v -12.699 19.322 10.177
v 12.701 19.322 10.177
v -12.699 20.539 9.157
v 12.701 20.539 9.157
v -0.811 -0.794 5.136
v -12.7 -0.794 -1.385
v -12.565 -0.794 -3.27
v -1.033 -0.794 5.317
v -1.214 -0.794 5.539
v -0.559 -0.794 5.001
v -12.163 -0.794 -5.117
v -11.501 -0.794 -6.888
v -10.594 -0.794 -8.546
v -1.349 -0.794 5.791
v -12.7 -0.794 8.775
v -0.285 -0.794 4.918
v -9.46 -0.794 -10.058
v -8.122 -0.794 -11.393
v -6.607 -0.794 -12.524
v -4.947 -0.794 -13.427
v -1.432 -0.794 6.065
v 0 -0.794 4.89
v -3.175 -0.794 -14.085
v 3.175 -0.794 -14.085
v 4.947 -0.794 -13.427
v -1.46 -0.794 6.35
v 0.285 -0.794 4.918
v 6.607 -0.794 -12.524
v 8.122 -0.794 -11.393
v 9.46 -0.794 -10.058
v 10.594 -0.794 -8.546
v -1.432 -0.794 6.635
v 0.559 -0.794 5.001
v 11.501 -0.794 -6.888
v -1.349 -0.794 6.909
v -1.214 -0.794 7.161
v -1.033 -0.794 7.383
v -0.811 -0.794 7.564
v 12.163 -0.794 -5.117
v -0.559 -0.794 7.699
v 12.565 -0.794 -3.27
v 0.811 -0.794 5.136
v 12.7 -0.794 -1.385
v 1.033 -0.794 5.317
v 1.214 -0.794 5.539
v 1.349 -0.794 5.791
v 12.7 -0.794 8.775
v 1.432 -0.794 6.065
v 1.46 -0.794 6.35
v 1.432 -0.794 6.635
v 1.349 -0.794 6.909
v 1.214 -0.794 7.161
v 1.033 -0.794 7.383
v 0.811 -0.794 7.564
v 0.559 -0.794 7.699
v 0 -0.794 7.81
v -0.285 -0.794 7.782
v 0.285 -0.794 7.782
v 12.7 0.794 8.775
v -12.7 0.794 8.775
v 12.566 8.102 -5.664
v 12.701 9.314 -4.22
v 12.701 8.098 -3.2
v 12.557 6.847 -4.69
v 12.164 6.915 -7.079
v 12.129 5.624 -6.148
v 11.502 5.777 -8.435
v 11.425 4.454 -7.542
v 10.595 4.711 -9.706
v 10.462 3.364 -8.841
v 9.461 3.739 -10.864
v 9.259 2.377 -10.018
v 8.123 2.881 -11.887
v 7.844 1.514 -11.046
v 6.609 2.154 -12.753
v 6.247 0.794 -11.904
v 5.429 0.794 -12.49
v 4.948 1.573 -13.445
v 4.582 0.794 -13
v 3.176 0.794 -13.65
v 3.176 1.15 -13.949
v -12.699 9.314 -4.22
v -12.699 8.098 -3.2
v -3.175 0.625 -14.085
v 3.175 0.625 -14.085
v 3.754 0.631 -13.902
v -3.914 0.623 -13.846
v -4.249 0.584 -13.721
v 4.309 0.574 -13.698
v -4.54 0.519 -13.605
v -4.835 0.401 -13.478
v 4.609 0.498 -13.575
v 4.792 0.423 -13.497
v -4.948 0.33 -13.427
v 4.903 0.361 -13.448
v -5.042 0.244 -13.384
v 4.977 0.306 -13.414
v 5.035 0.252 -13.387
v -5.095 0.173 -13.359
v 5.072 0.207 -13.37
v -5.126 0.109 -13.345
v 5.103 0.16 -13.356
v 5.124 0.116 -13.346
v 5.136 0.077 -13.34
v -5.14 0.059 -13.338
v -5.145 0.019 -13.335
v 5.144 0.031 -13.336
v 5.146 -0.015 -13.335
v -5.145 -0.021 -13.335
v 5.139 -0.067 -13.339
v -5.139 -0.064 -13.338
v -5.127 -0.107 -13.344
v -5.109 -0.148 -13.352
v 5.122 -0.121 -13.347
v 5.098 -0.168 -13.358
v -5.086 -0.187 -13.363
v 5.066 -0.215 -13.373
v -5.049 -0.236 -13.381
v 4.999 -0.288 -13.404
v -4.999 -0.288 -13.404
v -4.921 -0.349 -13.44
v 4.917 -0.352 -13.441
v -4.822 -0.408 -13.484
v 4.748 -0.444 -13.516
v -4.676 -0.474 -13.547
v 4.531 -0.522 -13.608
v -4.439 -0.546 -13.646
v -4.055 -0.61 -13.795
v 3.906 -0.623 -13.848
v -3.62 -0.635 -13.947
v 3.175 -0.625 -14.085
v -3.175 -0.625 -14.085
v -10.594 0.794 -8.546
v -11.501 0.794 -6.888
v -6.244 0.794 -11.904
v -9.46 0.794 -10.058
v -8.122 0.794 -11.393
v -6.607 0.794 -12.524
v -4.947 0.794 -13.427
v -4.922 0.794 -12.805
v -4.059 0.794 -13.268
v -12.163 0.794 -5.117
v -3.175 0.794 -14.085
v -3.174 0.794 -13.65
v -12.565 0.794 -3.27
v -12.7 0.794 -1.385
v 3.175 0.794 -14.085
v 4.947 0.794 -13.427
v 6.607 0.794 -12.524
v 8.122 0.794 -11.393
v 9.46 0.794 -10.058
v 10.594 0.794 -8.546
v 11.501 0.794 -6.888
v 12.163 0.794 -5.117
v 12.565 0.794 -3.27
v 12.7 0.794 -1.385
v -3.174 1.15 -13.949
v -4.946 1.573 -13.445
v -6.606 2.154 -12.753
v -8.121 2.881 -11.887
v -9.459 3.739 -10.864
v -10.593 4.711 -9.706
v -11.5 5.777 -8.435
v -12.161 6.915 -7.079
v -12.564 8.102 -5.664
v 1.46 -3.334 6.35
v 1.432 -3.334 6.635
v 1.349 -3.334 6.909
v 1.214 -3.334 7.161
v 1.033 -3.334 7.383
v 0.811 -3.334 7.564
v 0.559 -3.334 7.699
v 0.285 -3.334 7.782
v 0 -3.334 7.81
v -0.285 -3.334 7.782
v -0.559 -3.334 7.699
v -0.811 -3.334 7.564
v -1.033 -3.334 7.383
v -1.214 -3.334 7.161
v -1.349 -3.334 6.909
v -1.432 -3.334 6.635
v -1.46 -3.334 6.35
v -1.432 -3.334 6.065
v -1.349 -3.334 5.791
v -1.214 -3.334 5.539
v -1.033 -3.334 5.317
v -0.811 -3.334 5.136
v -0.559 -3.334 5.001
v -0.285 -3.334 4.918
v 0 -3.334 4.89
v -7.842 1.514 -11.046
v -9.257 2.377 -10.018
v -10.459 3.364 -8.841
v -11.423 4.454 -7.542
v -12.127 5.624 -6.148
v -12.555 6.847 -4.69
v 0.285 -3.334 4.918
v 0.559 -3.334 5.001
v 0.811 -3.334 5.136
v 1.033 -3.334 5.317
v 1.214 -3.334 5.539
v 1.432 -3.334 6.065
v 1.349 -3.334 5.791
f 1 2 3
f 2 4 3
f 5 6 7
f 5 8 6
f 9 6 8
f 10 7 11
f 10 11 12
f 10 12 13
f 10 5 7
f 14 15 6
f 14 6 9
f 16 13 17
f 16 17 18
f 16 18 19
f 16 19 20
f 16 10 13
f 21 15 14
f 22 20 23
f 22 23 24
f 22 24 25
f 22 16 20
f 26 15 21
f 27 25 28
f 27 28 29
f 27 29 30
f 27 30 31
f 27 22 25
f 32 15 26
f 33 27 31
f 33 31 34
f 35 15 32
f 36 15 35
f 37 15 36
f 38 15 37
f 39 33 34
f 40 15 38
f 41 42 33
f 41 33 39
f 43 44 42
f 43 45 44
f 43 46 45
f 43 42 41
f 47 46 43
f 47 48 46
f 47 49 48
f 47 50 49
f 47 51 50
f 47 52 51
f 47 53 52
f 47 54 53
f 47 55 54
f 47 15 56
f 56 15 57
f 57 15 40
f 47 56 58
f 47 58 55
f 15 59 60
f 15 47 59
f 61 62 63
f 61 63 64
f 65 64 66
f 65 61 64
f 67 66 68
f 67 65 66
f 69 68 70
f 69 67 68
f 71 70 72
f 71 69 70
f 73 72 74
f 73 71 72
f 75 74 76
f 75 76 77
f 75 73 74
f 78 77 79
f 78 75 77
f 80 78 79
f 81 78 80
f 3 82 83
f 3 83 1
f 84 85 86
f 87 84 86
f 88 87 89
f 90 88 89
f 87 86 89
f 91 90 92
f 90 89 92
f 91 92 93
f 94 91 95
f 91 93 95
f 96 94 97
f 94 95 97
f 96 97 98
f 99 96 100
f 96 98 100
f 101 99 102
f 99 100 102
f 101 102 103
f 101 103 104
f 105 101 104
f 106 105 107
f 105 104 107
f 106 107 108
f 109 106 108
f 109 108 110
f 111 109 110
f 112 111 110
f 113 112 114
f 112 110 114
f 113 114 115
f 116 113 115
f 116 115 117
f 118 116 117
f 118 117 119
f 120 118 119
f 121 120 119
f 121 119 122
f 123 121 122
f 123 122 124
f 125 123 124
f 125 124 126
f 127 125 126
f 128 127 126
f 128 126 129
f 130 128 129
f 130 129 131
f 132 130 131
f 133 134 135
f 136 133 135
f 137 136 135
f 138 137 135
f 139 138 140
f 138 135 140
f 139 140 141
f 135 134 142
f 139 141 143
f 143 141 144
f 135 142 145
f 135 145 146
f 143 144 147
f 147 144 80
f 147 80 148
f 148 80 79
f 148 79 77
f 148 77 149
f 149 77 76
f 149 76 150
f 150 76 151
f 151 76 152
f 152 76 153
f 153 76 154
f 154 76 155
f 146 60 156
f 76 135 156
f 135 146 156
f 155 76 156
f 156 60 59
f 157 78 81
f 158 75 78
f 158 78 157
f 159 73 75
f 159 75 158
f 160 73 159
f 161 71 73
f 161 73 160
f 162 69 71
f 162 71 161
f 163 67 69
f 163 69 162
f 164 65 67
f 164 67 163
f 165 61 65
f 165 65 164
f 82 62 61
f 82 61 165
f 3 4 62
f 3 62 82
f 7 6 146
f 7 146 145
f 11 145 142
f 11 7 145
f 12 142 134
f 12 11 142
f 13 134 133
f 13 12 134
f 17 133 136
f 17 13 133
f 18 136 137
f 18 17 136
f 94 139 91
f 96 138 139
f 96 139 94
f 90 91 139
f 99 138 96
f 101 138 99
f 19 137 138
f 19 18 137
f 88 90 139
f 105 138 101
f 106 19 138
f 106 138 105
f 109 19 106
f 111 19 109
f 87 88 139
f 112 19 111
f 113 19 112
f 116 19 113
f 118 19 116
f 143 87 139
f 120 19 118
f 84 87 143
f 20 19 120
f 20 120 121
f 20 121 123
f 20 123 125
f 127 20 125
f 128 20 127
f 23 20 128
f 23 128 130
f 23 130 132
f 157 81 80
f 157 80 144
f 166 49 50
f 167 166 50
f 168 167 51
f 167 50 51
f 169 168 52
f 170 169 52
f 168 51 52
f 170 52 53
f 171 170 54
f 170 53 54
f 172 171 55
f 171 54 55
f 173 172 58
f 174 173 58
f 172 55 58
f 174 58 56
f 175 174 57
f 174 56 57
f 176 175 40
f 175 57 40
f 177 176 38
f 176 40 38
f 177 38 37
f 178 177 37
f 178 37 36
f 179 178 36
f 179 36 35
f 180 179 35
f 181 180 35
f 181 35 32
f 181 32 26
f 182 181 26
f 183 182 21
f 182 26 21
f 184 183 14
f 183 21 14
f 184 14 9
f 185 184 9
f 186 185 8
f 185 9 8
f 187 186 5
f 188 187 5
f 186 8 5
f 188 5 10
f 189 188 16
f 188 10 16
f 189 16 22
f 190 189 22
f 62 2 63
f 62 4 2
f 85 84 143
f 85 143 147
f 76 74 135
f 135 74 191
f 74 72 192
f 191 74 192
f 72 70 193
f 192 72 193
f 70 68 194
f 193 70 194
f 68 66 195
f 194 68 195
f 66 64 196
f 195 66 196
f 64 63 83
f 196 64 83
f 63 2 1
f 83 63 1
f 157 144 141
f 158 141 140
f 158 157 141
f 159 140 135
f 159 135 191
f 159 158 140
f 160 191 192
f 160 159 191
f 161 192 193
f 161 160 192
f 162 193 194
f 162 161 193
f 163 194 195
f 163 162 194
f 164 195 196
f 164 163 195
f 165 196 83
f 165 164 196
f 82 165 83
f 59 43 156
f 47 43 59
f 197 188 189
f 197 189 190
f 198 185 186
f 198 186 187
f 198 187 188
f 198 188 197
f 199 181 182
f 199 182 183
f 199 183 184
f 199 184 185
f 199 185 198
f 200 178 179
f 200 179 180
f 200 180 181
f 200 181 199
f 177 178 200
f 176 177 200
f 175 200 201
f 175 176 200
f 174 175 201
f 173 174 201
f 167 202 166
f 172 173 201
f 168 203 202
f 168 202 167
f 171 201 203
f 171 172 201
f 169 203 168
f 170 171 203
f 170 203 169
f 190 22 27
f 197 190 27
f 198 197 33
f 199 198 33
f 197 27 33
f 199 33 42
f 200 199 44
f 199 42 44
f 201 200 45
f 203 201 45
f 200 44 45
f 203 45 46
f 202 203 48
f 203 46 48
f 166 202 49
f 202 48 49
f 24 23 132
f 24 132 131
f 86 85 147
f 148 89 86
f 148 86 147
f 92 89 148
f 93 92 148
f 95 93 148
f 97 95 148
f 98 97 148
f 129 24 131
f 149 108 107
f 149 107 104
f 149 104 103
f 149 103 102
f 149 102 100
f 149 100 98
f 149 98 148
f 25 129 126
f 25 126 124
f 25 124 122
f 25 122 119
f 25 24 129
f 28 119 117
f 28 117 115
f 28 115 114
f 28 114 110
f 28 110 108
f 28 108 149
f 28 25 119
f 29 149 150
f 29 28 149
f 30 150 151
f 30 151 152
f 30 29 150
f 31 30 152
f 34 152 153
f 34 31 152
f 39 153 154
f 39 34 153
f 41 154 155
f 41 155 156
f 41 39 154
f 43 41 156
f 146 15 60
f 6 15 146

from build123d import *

# Parameters (mm, degrees)
F2_W     = 25.4
F2_H     = 4.7625
F3_DEPTH = 0.79375
F4_DEPTH = 0.79375
F5_R     = 0.635
F6_DEPTH = 25.4
F8_DEPTH = 2.54


with BuildPart() as f3:
    # F2 (on face) → F3 (new body, symmetric)
    with BuildSketch(Plane(origin=(0, 6.935504, -5.819579), x_dir=(-1, 0, 0), z_dir=(0, 0.766044, -0.642788))):
        with BuildLine():
            Line((-12.701223, 15.454063), (-12.701223, 2.754063))
            ThreePointArc((-12.701223, 2.754063), (-10.055389, -5.183437), (-3.176223, -9.945937))
            Line((-3.176223, -9.945937), (-0.001223, -9.945937))
            Line((-0.001223, -9.945937), (3.173777, -9.945937))
            ThreePointArc((3.173777, -9.945937), (10.052944, -5.183437), (12.698777, 2.754063))
            Line((12.698777, 2.754063), (12.698777, 15.454063))
            Line((12.698777, 15.454063), (-12.701223, 15.454063))
        make_face()
        with Locations((-0.001223, 17.835313)):
            Rectangle(F2_W, F2_H)
    extrude(amount=F3_DEPTH, both=True)

    # F0 (on Front) → F4 (join, symmetric)
    with BuildSketch(Plane.XZ):
        with BuildLine():
            Line((-12.7, 8.77501), (-12.7, -1.38499))
            ThreePointArc((-12.7, -1.38499), (-10.054167, -9.32249), (-3.175, -14.08499))
            Line((-3.175, -14.08499), (0, -14.08499))
            Line((0, -14.08499), (3.175, -14.08499))
            ThreePointArc((3.175, -14.08499), (10.054167, -9.32249), (12.7, -1.38499))
            Line((12.7, -1.38499), (12.7, 8.77501))
            Line((12.7, 8.77501), (-12.7, 8.77501))
        make_face()
    extrude(amount=F4_DEPTH, both=True)

    # F5 (on Right) → F6 (cut, symmetric)
    with BuildSketch(Plane.YZ):
        with Locations((0, -13.97)):
            Circle(F5_R)
    extrude(amount=F6_DEPTH, both=True, mode=Mode.SUBTRACT)

    # F7 (on face) → F8 (join)
    with BuildSketch(Plane.XZ.offset(0.79375)):
        with BuildLine():
            ThreePointArc((0, 4.8895), (1.032729, 5.317271), (1.4605, 6.35))
            ThreePointArc((1.4605, 6.35), (-1.032729, 7.382729), (0, 4.8895))
        make_face()
    extrude(amount=F8_DEPTH)


solid = f3.part
